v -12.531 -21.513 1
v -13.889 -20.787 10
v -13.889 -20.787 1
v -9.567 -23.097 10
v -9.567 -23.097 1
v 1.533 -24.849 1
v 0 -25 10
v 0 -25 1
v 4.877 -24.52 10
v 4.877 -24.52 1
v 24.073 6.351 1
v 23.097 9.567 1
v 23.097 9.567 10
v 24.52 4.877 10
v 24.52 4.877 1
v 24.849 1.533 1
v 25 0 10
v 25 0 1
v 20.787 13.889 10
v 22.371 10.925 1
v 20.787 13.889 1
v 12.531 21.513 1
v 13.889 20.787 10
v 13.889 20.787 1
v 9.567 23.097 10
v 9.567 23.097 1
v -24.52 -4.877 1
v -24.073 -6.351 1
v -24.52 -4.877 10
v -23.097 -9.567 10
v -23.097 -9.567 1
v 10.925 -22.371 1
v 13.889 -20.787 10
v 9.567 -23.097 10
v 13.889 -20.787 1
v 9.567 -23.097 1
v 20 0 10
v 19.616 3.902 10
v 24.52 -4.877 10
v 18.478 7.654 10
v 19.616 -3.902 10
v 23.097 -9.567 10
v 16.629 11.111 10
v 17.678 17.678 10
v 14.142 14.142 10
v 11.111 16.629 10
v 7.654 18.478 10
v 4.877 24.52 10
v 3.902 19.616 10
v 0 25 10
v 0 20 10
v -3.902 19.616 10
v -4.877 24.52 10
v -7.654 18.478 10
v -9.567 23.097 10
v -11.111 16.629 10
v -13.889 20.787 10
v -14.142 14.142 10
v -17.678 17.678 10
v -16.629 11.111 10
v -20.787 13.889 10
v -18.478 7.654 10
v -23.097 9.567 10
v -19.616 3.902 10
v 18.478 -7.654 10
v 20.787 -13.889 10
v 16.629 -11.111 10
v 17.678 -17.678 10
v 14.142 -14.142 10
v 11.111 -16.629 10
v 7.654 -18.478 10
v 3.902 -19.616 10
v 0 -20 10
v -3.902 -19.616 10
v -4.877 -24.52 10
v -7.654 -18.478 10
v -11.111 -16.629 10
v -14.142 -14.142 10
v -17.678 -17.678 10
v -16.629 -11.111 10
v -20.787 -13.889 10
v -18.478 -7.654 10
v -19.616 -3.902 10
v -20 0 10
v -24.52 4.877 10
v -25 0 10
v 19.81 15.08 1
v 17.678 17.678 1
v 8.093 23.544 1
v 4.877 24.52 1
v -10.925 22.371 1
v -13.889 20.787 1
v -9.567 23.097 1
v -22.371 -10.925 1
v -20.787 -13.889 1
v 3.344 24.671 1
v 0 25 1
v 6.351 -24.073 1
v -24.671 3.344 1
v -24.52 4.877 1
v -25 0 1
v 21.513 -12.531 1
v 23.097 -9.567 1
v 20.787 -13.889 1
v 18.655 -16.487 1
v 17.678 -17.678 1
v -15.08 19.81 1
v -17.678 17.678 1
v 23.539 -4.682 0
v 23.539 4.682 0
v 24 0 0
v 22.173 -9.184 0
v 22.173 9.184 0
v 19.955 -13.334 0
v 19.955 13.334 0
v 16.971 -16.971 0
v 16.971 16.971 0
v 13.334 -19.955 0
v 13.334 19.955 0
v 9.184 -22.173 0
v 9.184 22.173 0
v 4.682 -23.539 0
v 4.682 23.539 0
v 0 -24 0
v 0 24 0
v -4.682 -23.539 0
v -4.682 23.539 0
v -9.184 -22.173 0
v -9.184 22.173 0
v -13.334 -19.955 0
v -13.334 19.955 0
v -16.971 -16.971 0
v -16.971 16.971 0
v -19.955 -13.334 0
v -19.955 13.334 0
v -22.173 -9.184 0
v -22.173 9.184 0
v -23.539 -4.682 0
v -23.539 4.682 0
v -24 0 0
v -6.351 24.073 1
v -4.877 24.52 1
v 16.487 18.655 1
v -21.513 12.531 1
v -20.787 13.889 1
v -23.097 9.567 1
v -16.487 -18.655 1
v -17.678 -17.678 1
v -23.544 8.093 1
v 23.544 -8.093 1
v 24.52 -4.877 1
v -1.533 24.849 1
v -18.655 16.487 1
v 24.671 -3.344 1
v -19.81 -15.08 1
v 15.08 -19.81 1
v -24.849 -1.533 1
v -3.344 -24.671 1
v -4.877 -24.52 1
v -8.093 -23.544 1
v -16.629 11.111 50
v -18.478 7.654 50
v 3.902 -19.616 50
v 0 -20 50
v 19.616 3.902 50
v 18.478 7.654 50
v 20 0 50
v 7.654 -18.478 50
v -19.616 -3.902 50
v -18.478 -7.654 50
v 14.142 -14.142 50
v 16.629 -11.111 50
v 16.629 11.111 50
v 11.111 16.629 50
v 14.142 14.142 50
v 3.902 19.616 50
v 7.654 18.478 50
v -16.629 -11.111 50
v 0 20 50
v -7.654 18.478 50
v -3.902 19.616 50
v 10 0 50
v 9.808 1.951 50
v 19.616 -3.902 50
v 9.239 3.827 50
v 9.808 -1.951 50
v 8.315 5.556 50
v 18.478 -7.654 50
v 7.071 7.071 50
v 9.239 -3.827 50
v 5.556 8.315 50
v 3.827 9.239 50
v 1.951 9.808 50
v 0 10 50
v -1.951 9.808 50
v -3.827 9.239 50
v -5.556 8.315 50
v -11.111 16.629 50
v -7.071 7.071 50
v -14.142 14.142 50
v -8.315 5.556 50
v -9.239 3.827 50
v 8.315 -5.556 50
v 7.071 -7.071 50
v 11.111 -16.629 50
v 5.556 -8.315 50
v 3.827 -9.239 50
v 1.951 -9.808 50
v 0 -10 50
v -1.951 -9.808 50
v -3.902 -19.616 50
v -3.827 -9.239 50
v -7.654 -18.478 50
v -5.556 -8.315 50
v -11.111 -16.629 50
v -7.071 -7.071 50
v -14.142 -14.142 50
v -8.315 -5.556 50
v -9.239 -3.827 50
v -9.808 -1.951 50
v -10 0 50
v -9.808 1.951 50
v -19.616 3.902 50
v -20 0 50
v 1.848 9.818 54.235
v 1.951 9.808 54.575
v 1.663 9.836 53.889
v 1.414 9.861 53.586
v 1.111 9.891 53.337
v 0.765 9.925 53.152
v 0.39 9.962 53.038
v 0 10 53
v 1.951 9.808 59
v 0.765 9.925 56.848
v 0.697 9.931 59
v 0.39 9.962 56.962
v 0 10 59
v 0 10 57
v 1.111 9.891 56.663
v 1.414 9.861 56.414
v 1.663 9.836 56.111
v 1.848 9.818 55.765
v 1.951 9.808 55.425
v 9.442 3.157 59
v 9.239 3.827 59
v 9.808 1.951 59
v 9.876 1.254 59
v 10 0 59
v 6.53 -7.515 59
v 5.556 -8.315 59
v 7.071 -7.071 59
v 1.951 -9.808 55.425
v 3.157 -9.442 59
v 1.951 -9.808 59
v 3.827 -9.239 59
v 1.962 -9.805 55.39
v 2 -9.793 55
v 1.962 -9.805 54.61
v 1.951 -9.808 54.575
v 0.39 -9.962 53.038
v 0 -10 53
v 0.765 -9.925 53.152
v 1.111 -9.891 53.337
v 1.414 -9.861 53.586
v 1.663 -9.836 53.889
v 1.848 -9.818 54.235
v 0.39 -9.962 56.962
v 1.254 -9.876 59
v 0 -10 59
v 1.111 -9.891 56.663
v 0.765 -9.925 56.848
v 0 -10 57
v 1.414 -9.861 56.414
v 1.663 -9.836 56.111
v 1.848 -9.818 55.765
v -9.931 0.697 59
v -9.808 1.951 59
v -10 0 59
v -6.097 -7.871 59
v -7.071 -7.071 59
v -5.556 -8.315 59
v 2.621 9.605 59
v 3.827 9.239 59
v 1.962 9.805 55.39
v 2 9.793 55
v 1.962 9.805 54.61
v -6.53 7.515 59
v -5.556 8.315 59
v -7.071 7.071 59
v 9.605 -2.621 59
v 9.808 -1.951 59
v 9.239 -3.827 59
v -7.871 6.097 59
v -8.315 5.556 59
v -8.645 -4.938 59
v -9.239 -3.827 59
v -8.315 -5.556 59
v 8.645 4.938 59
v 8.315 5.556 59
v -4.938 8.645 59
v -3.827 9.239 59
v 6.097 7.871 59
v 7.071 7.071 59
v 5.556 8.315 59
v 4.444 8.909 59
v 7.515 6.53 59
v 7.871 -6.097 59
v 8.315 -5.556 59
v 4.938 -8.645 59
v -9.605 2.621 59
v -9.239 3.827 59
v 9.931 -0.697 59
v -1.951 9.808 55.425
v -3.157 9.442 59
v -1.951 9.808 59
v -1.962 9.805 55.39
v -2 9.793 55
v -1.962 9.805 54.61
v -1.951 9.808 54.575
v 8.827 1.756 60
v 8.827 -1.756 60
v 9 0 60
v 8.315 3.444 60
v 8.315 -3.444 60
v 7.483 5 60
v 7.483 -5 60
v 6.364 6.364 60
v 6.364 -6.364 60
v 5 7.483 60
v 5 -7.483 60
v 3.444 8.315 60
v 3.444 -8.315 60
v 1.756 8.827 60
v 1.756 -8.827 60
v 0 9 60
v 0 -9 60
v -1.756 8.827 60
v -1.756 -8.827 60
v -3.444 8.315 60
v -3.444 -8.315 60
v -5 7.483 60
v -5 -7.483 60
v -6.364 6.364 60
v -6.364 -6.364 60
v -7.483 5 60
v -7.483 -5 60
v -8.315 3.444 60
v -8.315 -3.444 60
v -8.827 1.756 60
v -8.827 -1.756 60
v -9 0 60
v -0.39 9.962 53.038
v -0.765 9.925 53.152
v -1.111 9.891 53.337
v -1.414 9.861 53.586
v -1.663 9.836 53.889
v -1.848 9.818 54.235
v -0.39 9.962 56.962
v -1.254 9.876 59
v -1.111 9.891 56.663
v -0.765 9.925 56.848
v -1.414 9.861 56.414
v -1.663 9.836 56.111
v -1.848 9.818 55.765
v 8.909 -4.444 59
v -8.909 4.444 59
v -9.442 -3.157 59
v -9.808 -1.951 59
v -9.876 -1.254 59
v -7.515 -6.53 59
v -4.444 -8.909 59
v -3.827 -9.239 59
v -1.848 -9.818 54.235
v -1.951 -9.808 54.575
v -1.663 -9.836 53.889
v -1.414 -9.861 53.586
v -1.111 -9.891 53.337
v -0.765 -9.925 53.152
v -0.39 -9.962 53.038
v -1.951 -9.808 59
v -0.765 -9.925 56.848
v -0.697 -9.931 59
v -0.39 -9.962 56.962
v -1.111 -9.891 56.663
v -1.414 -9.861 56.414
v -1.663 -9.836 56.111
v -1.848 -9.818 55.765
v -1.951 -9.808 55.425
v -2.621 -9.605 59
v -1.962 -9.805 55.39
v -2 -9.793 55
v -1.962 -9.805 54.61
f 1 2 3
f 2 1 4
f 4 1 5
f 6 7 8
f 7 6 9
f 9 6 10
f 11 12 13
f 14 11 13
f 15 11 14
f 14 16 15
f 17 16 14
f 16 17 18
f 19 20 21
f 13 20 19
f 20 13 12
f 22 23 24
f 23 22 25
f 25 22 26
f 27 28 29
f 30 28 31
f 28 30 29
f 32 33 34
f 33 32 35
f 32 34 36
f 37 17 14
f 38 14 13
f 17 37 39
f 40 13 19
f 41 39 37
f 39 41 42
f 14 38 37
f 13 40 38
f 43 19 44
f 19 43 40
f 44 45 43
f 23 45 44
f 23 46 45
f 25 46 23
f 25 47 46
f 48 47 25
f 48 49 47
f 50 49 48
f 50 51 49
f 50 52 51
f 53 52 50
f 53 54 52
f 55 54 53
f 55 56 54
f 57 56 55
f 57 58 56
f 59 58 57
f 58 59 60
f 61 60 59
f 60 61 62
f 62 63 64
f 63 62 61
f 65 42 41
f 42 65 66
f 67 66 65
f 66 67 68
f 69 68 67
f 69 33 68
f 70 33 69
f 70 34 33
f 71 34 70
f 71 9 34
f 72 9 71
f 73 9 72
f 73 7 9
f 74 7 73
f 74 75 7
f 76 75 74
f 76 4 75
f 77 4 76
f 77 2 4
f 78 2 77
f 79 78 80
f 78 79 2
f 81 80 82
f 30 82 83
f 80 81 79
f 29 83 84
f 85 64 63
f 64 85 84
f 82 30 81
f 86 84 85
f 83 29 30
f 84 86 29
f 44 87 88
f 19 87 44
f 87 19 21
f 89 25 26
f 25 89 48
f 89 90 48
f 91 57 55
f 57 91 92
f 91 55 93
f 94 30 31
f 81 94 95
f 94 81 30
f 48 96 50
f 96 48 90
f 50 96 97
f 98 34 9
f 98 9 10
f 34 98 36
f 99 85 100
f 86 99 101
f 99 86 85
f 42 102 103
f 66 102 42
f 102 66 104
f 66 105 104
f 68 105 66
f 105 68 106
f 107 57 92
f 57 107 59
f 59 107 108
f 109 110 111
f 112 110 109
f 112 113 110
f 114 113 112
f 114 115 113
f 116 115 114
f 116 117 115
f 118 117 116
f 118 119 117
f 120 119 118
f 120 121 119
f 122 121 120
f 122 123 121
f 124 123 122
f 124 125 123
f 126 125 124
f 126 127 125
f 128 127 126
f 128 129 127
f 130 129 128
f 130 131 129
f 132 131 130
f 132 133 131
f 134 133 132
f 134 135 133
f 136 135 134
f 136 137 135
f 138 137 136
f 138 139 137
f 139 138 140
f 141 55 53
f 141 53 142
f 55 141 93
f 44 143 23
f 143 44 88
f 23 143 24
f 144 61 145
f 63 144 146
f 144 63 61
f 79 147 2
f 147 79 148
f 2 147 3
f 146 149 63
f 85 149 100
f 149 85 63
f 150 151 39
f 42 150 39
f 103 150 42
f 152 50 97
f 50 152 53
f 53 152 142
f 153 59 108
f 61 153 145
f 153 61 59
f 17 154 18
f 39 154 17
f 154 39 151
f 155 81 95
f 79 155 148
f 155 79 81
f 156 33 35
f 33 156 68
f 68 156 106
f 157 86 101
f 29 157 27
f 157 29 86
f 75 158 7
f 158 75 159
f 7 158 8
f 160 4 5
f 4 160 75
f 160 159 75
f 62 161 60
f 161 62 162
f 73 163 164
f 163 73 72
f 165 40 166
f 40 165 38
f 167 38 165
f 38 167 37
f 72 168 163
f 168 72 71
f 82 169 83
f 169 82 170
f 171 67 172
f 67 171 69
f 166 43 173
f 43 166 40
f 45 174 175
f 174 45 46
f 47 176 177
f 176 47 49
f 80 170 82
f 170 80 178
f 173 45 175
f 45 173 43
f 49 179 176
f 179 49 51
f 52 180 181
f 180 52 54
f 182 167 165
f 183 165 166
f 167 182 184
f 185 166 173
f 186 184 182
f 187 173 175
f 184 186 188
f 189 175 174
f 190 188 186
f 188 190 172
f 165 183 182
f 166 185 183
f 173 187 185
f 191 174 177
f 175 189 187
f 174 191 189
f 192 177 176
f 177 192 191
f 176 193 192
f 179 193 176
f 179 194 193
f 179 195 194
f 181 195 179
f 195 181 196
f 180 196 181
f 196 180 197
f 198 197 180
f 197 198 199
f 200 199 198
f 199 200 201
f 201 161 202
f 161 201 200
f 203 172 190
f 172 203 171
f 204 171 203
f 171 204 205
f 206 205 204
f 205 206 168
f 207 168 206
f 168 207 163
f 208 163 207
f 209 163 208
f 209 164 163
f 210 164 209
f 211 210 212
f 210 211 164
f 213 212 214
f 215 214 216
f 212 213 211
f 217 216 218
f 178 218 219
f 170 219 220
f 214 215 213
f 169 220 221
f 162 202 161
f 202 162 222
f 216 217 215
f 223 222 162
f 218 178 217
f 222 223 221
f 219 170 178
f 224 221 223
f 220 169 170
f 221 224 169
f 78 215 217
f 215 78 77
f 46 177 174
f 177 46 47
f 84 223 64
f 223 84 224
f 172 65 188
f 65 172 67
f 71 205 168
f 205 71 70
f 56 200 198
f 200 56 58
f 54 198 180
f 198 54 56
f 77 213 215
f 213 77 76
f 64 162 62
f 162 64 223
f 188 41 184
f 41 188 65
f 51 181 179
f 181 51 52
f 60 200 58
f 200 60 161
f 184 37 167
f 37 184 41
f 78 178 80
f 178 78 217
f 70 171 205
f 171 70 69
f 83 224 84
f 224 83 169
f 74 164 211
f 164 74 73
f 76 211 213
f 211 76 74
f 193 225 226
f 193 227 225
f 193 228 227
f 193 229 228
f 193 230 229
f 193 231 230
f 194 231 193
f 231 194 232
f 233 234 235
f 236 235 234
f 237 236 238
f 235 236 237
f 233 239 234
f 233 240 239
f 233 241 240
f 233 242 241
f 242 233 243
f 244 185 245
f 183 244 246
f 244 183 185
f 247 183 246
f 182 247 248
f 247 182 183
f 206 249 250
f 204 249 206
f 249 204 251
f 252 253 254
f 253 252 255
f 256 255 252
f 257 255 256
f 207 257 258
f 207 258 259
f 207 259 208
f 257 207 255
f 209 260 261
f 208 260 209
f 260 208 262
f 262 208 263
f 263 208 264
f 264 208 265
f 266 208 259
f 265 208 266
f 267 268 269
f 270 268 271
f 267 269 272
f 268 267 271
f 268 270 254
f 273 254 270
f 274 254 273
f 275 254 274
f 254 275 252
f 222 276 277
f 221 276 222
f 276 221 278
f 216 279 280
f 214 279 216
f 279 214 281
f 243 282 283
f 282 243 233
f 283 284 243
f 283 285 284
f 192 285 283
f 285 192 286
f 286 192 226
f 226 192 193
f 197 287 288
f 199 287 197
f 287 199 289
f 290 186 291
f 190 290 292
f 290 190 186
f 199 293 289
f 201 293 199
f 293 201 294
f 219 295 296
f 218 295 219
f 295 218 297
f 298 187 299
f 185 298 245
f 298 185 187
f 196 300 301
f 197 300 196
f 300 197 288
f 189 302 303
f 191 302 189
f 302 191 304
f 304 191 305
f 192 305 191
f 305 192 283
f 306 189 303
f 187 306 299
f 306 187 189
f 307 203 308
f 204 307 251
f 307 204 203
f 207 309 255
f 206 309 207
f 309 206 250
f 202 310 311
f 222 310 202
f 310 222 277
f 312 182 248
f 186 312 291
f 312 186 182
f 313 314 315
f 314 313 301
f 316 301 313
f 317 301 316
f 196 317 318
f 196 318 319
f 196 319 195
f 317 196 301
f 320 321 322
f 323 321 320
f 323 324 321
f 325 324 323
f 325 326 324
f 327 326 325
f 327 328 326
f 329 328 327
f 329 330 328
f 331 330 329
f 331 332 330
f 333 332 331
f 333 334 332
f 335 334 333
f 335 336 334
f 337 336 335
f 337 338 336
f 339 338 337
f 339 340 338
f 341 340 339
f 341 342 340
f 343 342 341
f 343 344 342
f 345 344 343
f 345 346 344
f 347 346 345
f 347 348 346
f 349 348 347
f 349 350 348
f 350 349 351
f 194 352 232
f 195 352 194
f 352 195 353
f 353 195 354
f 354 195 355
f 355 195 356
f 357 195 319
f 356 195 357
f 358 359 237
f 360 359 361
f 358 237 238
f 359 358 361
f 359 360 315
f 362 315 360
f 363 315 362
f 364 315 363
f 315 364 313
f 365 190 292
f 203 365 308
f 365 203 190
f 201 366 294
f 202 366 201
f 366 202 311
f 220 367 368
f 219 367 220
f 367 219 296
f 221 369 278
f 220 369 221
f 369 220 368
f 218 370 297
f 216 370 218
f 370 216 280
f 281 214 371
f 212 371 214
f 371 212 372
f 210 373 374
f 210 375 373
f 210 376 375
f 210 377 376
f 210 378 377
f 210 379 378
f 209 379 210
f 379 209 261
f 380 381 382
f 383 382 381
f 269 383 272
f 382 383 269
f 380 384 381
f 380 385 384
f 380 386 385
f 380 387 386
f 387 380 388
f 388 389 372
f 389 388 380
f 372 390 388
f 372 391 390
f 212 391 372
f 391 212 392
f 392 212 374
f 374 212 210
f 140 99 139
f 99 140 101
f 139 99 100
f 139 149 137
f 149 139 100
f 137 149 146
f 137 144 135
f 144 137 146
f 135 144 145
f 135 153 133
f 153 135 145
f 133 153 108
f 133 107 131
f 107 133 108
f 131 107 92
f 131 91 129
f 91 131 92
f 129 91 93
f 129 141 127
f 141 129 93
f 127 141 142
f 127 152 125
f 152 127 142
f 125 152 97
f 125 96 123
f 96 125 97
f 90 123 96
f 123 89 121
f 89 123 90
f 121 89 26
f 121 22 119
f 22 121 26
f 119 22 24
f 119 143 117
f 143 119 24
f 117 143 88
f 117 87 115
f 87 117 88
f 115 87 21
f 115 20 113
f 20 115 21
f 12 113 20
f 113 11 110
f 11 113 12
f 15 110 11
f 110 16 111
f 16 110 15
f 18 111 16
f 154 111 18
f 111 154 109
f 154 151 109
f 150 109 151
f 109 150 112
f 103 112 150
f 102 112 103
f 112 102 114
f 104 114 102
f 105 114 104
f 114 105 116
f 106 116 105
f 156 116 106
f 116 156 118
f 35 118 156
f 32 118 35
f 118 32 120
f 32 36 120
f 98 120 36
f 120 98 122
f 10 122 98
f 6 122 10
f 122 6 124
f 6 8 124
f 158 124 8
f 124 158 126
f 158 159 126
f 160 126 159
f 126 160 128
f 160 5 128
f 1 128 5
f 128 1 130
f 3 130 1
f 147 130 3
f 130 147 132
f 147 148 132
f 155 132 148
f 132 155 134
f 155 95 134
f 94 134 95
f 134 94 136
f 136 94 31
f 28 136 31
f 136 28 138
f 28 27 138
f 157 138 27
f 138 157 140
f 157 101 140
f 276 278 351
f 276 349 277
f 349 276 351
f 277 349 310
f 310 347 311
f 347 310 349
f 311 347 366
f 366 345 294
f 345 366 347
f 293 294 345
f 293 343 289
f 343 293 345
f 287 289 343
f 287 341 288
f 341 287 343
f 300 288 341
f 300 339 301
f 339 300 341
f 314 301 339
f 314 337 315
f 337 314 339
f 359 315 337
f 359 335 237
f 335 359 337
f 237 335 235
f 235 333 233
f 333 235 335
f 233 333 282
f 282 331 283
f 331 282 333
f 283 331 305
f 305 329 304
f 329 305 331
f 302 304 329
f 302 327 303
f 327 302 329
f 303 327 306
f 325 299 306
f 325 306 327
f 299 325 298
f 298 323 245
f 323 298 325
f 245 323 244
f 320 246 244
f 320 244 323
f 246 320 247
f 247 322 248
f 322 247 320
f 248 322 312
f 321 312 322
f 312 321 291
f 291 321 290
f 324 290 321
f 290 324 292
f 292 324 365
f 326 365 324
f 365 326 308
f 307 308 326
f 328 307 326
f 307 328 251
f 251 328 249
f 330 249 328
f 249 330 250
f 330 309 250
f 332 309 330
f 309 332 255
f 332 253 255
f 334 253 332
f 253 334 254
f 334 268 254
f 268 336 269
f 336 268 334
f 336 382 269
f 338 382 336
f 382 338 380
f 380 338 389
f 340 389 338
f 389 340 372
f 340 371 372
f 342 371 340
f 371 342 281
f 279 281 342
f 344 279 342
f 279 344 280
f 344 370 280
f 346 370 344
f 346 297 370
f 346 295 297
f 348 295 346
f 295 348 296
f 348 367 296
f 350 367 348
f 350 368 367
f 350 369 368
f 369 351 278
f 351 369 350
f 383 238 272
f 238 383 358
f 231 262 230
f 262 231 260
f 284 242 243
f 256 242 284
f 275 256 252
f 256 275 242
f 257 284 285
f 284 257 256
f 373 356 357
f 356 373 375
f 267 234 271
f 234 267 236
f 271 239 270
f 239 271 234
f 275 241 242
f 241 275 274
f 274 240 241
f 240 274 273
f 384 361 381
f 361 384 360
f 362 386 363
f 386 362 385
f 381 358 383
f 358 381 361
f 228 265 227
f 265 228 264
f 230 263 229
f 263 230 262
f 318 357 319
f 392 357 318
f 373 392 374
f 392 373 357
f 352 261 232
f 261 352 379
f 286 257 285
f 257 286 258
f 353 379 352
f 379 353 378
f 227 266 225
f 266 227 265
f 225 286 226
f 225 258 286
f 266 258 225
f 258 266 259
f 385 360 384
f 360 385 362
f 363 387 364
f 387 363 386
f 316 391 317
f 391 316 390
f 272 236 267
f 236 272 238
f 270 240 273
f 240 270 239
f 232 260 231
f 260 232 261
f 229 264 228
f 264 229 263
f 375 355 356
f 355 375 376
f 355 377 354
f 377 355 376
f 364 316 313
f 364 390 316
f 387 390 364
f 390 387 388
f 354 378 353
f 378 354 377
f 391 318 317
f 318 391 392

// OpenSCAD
$fn = 32;

// ----------------------------------------------------------------------
// Stepped shaft: diameters 50, 40, 20 mm, 60 mm long
// ----------------------------------------------------------------------

// --- parameters (mm) ---
d1 = 50;                  // step 1 diameter
len1 = 10;                // step 1 length
d2 = 40;                  // step 2 diameter
len2 = 40;                // step 2 length
d3 = 20;                  // step 3 diameter
len3 = 10;                // step 3 length
total = 60;               // overall length
chamfer = 1;              // end chamfer
cross_d = 4;              // cross pin hole
cross_z = 55;             // cross hole position

difference() {
  /* turned body: stacked cylinders, every step sunk into the bigger one */
  union() {
    cylinder(h = len1, d = d1);
    translate([0, 0, 9.6]) cylinder(h = 40.4, d = d2);
    translate([0, 0, 49.6]) cylinder(h = 10.4, d = d3);
  }
  /* bottom chamfer ring cut */
  rotate_extrude() translate([24, -2.5]) polygon([[0, 0], [3.5, 0], [3.5, 6], [0, 2.5]]);
  /* top chamfer ring cut */
  rotate_extrude() translate([9, 60]) polygon([[0, 0], [3.5, -3.5], [3.5, 2.5], [0, 2.5]]);
  /* cross pin hole through the small step */
  translate([0, 0, cross_z]) rotate([90, 0, 0]) cylinder(h = d3 + 5, d = cross_d, center = true);
}
